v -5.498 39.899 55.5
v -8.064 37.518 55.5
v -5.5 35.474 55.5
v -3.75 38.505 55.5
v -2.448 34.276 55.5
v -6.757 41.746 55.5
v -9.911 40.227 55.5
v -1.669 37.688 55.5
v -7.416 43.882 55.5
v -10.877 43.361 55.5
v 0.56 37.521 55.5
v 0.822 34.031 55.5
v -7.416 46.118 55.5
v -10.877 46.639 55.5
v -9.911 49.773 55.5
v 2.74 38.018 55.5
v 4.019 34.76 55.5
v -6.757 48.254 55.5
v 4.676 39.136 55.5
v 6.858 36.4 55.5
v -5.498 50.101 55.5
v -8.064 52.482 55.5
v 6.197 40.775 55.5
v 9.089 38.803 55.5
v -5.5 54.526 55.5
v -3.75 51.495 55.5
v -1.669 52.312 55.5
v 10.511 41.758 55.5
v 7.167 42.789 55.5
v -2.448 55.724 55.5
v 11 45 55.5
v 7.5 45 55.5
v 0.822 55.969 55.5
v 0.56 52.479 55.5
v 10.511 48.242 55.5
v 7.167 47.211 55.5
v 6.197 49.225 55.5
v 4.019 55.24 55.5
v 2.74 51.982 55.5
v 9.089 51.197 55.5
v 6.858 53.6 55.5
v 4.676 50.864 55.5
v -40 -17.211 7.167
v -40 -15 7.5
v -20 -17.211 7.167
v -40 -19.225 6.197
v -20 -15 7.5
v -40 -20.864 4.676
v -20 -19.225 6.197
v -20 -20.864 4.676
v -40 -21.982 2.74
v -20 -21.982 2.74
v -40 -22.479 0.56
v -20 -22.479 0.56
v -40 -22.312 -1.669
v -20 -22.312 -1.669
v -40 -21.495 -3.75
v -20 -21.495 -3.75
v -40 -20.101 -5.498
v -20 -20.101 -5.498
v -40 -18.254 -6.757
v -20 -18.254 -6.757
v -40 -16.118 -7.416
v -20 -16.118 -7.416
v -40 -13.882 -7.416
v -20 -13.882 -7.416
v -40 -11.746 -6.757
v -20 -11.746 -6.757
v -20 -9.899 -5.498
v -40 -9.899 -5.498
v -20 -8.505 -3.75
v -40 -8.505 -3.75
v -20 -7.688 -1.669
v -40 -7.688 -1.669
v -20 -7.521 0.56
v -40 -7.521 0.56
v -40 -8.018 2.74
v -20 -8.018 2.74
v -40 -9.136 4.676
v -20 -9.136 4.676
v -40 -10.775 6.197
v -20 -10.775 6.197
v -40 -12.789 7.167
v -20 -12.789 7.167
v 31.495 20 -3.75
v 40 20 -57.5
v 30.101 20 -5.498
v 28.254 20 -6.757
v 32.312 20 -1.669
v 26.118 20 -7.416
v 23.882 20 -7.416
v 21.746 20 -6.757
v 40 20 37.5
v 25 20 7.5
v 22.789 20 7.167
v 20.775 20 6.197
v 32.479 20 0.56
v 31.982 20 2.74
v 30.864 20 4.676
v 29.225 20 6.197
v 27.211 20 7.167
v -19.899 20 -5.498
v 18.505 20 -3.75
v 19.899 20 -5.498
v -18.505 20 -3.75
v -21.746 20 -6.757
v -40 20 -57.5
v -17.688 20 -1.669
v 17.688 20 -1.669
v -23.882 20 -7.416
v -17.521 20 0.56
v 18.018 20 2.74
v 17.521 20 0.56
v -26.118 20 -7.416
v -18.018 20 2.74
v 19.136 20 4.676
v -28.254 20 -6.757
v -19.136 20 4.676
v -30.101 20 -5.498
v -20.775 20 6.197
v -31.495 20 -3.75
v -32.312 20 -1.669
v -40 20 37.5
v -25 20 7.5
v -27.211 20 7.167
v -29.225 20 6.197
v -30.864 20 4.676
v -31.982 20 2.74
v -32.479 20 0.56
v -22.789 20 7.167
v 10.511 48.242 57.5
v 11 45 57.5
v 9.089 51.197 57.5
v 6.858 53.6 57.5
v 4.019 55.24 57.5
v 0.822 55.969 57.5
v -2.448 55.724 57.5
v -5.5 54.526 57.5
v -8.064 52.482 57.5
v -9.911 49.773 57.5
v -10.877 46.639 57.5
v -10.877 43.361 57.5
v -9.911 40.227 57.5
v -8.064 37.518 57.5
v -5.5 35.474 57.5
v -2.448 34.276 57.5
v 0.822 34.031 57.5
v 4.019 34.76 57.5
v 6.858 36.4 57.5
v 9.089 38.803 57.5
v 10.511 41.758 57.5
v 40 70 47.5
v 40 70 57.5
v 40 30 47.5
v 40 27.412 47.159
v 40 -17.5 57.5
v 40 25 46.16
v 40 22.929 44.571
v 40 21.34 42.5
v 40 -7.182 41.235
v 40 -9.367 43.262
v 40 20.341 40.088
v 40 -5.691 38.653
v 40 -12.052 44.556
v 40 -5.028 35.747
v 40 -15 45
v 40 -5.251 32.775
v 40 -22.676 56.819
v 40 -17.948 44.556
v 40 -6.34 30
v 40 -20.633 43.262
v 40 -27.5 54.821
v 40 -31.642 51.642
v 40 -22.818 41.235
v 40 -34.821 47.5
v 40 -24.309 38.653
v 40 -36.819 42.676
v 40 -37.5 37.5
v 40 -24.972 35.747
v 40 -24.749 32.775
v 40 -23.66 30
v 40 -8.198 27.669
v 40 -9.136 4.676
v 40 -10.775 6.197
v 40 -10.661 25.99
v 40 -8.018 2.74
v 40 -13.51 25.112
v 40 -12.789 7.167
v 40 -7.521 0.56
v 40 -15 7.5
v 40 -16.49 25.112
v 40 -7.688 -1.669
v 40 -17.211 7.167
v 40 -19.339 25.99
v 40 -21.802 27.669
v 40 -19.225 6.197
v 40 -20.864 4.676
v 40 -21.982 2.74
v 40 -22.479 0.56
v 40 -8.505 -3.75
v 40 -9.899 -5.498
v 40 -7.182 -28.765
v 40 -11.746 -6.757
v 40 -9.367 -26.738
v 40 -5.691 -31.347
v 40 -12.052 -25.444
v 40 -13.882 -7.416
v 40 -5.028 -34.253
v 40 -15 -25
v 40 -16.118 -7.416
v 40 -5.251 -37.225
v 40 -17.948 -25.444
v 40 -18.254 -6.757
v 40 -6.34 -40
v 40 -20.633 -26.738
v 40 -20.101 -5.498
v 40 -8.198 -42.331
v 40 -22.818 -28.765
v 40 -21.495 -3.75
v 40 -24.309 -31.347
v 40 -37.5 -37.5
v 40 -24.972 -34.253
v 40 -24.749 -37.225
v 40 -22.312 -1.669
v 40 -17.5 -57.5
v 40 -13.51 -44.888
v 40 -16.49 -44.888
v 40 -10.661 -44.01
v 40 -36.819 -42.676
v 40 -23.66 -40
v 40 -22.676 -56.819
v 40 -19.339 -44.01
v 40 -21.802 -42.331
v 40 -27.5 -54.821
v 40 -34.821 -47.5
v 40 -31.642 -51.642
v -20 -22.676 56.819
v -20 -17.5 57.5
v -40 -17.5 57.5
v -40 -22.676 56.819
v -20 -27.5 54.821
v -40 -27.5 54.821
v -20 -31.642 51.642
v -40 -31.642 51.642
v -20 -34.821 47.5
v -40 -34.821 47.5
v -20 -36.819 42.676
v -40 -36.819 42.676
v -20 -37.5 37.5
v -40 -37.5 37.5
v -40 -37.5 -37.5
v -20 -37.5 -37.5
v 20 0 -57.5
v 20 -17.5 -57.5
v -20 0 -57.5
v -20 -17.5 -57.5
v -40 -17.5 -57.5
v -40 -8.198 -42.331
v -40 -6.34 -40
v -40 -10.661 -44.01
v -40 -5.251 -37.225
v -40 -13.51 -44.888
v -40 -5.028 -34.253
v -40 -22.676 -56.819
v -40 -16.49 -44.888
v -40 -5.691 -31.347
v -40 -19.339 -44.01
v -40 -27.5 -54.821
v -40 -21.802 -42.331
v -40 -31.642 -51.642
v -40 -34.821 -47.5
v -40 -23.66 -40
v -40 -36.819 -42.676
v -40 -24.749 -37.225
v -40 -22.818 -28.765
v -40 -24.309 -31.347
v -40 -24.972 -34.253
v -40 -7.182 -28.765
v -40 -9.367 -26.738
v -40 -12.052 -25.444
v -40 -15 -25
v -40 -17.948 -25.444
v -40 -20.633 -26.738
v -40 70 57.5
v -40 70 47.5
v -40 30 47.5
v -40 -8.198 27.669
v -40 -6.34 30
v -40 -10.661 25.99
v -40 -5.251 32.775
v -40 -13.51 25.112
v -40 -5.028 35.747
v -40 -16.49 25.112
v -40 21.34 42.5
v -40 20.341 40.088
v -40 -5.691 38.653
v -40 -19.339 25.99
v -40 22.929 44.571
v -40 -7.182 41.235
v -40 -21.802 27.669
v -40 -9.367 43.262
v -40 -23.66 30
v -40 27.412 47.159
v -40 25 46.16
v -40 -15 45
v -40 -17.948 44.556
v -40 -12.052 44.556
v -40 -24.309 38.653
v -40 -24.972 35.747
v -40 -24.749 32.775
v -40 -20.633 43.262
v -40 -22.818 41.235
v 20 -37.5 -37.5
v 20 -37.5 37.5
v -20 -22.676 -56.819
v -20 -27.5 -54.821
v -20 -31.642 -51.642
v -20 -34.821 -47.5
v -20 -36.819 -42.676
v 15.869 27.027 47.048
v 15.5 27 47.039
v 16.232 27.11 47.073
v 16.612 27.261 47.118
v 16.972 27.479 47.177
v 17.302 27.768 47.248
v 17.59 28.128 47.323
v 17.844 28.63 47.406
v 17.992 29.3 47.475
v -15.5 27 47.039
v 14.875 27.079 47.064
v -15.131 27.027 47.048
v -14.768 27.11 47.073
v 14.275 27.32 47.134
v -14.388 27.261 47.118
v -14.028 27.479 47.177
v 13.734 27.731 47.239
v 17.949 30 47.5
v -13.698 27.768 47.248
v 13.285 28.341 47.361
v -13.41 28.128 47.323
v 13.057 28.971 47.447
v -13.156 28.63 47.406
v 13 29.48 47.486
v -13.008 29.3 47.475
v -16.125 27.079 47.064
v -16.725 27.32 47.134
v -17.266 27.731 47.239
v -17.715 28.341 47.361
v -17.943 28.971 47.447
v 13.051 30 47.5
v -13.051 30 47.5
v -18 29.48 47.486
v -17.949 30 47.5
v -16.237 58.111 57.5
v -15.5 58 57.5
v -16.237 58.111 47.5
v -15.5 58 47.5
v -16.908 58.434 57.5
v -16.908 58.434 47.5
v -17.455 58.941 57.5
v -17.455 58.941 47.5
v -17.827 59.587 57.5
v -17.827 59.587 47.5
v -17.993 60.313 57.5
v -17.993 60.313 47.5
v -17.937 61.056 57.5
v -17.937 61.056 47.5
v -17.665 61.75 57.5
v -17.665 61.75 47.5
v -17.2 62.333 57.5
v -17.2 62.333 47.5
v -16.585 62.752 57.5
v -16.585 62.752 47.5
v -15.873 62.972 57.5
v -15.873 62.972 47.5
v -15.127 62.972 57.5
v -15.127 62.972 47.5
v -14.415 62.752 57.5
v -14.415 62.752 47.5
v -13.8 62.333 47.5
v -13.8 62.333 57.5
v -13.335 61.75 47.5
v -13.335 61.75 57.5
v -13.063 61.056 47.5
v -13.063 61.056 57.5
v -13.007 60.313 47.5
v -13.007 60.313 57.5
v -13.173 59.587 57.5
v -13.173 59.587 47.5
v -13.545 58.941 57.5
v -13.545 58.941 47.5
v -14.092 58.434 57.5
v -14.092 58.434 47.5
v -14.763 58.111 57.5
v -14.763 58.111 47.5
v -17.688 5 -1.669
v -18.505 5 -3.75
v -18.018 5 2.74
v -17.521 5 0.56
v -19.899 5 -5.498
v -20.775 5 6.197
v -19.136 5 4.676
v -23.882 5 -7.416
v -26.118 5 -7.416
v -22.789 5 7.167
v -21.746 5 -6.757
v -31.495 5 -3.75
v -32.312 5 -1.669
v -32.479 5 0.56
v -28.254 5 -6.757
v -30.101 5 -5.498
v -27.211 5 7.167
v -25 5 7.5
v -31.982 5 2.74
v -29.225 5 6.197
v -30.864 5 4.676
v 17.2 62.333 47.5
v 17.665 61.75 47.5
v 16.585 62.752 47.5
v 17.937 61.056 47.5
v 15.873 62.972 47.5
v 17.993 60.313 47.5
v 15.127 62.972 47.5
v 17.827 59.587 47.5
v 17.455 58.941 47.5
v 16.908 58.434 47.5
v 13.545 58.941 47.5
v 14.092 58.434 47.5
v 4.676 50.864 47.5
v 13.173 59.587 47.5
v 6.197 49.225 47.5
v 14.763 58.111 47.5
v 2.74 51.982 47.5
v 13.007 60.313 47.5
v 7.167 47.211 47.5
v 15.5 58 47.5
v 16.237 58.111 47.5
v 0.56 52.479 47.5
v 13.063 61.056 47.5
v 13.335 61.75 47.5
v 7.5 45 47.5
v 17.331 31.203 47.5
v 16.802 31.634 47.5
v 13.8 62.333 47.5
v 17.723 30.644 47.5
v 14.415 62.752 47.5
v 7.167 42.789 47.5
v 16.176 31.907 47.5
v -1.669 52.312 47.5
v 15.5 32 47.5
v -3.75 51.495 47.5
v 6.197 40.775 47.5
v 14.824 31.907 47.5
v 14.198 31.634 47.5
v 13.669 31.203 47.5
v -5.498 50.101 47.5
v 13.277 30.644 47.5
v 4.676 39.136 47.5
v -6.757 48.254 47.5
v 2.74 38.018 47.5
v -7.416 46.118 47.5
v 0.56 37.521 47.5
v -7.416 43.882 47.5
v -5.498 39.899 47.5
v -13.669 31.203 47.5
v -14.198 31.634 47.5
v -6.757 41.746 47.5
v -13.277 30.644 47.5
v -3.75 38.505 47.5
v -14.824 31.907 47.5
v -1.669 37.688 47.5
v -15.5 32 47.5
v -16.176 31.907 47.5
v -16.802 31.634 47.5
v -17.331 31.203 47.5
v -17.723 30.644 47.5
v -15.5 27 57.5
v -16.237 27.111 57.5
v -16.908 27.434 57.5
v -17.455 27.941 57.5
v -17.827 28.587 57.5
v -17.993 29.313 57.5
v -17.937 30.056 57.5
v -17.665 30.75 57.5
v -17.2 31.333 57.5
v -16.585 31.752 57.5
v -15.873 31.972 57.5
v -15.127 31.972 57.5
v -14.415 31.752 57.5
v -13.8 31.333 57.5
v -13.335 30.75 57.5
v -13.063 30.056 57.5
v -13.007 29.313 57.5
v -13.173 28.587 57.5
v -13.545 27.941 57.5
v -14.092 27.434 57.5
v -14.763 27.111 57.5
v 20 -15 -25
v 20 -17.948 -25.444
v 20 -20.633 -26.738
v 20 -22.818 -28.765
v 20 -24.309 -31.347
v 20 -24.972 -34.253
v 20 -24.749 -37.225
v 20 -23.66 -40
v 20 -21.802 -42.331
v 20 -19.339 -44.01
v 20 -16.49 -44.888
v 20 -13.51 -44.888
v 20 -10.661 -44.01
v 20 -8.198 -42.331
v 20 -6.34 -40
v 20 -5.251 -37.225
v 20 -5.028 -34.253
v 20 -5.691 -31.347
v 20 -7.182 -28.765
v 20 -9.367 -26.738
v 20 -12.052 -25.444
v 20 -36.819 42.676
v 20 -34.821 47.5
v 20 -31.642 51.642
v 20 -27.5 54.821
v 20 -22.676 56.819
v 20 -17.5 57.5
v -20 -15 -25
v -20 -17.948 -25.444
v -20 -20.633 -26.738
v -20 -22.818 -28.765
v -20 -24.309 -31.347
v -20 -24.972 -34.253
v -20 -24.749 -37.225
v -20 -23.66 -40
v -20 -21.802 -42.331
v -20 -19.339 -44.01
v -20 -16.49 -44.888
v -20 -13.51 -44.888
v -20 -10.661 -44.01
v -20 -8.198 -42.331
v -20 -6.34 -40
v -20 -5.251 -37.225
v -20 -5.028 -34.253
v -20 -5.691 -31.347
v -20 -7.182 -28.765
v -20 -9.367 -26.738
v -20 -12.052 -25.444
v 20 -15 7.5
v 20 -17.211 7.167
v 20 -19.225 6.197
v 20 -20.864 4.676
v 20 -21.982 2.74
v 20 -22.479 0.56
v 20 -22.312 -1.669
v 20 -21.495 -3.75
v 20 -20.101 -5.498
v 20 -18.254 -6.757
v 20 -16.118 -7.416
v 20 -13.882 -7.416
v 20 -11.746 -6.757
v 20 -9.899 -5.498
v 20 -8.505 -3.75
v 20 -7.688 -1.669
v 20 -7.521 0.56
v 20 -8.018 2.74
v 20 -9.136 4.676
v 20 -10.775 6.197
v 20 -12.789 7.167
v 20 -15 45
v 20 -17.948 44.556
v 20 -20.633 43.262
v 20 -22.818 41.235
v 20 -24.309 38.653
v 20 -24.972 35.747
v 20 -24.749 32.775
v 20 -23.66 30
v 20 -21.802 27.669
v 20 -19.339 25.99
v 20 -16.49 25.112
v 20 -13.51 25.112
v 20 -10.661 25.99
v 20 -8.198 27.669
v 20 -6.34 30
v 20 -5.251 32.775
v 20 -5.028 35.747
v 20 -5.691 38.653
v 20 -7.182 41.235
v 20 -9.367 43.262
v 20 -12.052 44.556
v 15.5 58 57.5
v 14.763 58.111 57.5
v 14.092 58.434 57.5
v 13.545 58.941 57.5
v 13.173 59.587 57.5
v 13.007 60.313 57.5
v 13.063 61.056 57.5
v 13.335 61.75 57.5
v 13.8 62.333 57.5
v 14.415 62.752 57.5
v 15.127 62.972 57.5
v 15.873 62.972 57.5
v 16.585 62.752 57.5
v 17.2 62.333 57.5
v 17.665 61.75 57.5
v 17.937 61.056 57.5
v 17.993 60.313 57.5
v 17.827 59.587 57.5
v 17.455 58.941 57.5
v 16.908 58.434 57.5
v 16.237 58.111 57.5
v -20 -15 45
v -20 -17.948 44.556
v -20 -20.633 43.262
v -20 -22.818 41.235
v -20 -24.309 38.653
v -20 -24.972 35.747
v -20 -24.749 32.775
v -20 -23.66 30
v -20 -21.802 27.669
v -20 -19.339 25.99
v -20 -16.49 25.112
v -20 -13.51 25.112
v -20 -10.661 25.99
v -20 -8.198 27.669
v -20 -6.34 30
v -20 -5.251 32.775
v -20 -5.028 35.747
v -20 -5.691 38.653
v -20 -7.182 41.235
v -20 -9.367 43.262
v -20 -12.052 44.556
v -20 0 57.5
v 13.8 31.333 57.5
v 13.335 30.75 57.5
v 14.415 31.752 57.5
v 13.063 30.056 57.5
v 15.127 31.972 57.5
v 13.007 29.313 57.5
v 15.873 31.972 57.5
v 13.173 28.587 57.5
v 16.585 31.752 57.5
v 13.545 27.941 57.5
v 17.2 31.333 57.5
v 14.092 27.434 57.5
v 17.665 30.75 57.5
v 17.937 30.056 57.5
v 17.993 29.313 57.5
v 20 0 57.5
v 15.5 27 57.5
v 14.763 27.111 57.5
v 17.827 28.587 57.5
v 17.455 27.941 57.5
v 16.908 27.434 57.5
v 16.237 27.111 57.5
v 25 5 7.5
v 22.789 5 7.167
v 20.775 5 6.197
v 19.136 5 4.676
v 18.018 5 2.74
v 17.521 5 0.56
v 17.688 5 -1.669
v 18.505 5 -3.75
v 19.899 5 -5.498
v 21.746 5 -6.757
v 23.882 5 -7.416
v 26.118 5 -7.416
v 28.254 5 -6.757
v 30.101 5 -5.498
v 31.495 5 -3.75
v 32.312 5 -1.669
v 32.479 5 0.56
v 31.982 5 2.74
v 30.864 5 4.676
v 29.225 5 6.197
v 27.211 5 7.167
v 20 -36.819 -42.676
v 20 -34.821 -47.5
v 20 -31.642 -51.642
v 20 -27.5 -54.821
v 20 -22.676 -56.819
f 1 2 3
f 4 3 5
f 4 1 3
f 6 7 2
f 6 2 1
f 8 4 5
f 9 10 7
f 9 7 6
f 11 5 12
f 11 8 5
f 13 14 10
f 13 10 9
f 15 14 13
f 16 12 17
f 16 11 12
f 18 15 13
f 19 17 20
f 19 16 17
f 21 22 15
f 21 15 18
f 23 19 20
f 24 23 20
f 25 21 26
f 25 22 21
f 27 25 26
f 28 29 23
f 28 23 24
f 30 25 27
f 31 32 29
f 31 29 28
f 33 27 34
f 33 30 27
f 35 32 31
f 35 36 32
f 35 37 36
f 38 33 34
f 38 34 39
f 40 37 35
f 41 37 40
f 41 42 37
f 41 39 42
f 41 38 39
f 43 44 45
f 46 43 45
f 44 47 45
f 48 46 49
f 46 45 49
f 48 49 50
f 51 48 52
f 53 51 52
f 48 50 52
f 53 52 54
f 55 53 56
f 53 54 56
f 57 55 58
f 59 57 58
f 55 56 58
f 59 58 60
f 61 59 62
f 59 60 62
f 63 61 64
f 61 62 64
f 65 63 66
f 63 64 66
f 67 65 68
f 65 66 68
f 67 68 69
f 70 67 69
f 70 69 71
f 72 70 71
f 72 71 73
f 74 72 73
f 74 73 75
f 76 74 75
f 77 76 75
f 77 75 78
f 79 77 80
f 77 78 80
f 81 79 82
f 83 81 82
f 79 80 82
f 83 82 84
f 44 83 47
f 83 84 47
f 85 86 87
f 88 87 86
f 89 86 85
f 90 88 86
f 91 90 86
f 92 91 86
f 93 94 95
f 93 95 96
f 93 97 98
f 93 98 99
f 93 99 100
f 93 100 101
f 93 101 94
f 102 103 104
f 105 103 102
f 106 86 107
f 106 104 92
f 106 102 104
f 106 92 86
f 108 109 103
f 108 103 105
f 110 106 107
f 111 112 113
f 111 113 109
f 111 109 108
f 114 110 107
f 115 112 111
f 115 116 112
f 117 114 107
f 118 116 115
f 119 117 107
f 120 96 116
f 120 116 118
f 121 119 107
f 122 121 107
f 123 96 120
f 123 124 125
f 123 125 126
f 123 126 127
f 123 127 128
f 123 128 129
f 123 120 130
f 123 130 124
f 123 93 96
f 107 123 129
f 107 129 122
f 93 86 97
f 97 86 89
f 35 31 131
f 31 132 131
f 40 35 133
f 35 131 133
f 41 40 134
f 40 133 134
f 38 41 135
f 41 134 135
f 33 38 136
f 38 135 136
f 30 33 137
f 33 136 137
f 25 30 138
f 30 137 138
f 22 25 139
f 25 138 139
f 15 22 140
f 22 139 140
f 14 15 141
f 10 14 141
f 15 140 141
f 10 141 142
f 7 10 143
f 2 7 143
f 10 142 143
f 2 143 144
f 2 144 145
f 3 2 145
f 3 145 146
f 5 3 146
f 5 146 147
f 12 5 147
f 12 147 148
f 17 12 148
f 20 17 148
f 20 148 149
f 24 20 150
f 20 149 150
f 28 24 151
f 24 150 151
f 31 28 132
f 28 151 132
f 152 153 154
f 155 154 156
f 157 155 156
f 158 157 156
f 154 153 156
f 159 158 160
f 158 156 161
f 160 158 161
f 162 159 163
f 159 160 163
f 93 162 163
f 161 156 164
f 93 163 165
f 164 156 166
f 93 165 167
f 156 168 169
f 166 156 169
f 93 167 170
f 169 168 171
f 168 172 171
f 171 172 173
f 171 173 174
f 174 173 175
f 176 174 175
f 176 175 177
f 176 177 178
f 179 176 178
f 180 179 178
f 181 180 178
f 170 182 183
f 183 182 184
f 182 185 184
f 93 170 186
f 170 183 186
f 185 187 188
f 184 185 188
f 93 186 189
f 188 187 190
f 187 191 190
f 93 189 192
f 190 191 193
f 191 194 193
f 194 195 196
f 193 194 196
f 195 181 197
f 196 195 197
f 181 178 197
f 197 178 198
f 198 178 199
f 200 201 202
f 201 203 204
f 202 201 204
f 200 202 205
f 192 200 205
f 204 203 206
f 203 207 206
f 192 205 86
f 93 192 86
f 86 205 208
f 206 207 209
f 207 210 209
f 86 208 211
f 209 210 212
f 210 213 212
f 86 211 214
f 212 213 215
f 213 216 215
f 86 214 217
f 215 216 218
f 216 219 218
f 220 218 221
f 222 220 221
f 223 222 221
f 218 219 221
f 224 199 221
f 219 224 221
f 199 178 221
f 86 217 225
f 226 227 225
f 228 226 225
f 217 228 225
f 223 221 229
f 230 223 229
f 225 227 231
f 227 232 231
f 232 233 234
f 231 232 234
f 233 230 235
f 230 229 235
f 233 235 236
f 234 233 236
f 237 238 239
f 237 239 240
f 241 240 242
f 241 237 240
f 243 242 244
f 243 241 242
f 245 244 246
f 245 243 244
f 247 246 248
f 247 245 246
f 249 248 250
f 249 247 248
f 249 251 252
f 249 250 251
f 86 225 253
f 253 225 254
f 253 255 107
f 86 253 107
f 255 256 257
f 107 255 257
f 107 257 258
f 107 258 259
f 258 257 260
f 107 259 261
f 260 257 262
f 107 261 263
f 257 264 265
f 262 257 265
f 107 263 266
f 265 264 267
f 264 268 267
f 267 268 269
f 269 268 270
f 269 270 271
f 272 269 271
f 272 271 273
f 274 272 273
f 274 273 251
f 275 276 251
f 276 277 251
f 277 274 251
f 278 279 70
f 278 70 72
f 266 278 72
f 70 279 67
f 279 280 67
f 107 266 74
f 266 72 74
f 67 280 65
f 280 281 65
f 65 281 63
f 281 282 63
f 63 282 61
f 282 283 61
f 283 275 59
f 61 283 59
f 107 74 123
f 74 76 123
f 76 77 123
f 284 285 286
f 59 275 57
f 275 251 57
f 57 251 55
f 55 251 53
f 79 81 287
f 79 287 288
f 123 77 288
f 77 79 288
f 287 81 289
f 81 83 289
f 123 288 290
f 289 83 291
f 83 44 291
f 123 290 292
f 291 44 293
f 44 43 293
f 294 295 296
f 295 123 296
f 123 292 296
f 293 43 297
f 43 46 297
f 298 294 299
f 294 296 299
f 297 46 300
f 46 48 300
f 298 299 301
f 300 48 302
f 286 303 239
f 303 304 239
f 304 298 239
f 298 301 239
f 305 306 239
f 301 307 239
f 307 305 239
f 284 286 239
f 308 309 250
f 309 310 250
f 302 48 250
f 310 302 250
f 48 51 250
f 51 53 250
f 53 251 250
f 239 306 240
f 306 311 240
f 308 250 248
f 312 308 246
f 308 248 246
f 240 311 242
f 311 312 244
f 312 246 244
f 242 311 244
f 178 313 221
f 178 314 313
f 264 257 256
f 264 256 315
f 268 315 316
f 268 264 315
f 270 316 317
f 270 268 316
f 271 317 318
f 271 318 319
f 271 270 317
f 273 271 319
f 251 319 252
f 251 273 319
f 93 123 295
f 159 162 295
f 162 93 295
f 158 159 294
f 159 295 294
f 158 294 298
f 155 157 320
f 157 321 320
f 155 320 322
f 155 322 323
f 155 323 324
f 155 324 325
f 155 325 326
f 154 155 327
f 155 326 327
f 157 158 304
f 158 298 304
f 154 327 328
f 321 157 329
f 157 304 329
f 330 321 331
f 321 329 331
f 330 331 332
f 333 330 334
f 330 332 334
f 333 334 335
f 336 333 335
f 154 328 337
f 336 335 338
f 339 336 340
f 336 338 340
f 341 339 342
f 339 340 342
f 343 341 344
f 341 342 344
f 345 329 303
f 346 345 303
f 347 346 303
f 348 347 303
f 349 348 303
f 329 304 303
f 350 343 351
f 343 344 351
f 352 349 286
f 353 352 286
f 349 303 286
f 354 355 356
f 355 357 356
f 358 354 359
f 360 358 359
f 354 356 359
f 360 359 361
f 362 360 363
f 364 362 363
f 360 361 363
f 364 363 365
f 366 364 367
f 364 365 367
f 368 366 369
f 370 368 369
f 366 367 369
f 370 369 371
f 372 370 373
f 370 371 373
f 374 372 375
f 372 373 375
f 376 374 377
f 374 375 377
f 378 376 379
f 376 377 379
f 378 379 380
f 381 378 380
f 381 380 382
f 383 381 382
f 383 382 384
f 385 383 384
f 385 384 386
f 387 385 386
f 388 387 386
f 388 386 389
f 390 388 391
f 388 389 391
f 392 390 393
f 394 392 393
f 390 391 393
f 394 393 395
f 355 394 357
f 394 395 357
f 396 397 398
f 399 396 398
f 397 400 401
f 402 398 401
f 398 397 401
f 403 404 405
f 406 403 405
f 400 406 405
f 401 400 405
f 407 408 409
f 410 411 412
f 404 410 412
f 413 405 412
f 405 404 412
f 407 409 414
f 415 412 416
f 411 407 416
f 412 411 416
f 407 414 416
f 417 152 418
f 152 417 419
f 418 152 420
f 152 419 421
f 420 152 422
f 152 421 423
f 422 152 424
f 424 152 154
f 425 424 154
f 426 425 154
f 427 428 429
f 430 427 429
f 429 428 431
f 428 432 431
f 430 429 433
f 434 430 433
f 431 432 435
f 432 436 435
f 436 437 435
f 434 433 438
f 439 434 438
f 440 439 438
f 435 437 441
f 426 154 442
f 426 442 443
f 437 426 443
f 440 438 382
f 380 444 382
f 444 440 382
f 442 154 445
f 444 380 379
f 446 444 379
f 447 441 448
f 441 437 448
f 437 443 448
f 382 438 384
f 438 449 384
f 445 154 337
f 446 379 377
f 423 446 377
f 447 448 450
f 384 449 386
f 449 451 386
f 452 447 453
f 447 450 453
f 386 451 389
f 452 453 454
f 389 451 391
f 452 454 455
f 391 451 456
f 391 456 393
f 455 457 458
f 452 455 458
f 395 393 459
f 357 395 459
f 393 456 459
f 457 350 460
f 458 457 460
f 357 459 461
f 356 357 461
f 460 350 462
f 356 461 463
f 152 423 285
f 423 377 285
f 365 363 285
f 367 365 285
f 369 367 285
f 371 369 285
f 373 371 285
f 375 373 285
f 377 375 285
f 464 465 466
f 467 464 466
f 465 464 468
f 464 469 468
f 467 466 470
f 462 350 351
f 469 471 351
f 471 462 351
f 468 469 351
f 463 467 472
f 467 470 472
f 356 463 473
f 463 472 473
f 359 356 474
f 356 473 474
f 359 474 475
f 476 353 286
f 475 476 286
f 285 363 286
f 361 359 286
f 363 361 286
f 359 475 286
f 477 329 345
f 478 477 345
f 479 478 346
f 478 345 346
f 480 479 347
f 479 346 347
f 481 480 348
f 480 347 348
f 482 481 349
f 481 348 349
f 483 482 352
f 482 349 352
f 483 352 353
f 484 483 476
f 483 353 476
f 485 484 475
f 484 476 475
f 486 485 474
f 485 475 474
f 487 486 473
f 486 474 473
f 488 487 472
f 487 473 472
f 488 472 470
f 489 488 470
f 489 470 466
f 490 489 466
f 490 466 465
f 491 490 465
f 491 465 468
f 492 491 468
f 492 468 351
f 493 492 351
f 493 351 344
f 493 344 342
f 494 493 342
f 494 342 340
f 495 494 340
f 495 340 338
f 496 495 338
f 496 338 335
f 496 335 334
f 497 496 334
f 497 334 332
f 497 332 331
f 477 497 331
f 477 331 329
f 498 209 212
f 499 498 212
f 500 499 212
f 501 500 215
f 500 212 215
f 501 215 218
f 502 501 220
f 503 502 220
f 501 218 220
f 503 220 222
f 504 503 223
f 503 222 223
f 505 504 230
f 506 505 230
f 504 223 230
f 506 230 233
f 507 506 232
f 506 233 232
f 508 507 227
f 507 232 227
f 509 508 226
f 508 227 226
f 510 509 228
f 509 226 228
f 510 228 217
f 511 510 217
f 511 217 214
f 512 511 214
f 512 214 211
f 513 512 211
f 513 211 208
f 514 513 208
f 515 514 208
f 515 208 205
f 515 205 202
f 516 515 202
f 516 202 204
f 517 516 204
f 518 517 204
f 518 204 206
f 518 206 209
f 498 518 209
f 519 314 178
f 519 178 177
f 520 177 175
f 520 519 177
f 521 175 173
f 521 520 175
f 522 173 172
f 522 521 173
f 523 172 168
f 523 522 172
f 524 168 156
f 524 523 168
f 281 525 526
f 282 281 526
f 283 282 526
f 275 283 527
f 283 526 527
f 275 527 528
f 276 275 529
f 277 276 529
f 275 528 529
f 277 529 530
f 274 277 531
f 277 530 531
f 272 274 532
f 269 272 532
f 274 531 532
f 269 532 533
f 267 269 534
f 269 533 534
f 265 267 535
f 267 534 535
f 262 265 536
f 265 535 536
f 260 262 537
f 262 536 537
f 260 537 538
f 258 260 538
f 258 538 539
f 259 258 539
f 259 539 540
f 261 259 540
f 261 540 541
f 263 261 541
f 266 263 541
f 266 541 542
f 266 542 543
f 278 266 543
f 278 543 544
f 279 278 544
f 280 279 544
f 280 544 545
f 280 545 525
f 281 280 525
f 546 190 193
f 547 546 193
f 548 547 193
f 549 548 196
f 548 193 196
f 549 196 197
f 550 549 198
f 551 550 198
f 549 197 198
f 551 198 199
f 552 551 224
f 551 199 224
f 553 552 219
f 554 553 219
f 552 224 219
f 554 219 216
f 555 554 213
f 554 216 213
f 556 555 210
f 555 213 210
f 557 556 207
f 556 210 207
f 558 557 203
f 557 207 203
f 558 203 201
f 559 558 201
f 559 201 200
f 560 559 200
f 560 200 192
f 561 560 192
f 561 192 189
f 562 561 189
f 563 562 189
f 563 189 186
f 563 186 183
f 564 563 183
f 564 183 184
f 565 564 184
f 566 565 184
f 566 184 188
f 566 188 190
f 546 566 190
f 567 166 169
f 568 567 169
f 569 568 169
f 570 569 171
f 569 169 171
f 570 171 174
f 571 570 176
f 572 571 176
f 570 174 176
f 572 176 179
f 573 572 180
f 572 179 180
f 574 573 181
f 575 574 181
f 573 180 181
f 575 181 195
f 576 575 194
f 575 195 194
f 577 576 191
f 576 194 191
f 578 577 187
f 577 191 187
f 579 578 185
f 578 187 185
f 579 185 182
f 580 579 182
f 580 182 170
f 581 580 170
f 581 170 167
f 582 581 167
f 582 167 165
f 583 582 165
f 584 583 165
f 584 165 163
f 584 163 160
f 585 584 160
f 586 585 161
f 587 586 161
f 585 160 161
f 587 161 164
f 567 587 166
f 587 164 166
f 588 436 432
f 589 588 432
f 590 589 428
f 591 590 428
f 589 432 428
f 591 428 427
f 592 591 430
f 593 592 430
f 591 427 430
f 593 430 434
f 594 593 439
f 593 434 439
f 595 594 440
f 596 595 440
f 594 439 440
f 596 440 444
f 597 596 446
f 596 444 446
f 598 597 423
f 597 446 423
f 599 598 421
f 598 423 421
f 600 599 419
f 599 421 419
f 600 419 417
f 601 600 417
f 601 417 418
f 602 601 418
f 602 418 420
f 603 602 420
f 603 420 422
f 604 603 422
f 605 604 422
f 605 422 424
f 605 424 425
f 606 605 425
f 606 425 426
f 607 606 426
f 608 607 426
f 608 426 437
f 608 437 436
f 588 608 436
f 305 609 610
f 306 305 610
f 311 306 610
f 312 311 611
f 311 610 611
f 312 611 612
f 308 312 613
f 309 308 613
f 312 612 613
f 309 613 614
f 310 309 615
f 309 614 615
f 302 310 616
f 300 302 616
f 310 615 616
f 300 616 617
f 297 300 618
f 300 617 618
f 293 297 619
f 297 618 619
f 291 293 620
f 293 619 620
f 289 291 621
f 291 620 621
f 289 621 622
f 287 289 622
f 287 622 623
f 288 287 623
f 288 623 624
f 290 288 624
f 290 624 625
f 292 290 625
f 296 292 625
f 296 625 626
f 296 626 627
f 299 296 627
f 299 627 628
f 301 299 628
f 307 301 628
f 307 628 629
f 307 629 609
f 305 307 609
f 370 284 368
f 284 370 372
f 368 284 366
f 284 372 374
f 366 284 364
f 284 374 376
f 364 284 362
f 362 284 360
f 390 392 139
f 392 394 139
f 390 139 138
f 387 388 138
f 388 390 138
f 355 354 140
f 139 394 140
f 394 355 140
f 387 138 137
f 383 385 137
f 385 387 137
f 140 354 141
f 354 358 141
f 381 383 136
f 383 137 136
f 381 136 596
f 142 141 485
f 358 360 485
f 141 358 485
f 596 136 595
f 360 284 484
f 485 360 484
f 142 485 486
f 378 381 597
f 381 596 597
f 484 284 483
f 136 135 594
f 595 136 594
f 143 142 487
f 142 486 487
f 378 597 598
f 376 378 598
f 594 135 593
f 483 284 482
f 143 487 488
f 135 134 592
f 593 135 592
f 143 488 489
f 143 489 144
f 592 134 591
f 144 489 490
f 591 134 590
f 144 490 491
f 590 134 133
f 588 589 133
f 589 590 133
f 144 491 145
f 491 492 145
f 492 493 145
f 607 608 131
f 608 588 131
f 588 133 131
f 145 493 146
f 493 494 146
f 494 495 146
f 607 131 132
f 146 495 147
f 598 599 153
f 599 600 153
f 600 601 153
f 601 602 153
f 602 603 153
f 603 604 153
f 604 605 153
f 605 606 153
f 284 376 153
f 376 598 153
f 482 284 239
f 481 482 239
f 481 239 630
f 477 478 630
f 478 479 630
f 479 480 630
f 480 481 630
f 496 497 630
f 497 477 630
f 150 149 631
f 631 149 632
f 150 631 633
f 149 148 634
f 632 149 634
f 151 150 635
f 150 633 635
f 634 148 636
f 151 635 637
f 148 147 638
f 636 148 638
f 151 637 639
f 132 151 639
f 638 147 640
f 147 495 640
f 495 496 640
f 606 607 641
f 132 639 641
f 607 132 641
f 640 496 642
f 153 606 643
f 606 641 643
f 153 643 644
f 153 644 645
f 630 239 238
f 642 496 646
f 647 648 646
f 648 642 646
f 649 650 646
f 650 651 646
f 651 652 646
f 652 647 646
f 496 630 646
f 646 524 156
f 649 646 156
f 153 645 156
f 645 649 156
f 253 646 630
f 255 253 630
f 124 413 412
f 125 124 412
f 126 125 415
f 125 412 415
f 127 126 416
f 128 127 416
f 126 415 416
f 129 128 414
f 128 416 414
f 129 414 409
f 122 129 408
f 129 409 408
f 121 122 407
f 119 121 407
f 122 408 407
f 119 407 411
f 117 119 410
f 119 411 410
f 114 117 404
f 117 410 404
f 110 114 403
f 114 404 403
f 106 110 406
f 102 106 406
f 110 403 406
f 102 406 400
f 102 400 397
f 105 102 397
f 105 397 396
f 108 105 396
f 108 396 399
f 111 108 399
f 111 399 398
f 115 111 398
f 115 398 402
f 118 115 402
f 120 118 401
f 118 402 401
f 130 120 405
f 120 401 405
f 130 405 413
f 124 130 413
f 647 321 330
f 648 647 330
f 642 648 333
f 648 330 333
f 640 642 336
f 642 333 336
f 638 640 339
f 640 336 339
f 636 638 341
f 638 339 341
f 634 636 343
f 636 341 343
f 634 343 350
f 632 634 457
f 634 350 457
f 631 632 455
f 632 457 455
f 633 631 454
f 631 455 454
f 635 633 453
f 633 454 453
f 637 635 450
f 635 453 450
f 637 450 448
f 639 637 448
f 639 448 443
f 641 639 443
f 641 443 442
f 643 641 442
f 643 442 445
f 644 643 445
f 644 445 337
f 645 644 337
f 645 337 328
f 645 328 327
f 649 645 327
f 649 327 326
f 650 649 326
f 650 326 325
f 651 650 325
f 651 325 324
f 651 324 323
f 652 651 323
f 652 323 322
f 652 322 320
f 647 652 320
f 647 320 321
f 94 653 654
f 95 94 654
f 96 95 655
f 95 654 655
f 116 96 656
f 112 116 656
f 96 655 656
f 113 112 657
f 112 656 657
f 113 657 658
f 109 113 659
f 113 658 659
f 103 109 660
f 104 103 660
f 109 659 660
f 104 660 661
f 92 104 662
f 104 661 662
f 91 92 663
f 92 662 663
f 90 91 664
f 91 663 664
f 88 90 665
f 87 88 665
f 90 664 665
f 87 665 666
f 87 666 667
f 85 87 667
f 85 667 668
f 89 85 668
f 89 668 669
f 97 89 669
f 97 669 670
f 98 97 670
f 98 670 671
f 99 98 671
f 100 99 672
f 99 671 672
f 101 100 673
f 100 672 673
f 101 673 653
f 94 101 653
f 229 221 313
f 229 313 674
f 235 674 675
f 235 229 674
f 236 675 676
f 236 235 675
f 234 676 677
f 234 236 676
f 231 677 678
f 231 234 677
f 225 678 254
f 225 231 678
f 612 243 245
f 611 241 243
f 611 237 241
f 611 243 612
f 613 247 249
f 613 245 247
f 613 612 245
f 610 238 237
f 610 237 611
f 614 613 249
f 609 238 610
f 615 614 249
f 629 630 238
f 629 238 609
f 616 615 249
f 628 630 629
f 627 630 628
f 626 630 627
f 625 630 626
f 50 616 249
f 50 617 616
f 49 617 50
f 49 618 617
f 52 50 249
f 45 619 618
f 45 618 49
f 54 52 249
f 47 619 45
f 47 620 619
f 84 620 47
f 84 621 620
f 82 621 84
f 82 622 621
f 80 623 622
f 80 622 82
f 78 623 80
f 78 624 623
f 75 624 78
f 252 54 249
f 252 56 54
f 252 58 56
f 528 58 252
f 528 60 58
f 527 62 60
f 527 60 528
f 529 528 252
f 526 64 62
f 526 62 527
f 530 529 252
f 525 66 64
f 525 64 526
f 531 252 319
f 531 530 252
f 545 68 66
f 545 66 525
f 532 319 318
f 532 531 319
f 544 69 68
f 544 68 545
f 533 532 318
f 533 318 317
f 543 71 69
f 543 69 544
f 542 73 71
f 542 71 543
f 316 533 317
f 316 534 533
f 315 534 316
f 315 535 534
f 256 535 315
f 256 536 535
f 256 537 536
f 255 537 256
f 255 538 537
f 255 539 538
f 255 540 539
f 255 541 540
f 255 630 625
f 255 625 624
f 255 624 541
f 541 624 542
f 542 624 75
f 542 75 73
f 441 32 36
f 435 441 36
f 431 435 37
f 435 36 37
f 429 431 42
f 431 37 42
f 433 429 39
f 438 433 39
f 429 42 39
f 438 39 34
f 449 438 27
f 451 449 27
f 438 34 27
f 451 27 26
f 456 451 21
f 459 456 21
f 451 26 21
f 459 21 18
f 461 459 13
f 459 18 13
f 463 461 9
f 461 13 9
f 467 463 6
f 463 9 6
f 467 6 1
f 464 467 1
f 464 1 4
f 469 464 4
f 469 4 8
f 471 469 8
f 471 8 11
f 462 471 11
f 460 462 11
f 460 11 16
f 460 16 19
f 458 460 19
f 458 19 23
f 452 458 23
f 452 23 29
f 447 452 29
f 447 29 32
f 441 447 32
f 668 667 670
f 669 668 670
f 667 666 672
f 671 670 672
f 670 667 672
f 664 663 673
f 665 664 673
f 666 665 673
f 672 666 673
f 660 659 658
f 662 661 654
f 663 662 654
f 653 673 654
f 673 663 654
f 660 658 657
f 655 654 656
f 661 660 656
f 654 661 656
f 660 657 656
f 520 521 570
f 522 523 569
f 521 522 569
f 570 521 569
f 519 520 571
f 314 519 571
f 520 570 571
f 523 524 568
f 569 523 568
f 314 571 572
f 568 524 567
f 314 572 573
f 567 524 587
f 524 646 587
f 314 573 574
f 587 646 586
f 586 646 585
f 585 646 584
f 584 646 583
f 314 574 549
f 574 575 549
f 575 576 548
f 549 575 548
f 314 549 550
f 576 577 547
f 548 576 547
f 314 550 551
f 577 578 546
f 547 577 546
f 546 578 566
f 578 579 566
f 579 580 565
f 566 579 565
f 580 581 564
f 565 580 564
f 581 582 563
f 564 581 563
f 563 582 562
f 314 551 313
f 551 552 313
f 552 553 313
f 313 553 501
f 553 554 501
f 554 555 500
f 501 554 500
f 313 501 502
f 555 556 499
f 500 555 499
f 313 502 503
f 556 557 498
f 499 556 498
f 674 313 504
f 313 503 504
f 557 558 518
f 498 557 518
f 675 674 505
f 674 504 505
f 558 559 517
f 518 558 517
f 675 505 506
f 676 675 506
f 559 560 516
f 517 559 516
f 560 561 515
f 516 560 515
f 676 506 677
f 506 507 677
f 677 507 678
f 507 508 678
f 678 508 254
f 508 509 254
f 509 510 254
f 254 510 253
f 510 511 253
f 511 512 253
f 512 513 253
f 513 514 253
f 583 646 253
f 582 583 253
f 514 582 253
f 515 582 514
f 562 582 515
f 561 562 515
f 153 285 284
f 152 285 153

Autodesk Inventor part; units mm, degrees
ref_plane "YZ Plane" through (0, 0, 0) normal (1, 0, 0) x (0, 1, 0)
ref_plane "XZ Plane" through (0, 0, 0) normal (0, 1, 0) x (-1, 0, 0)
ref_plane "XY Plane" through (0, 0, 0) normal (0, 0, 1) x (1, 0, 0)
sketch "Sketch1" plane through (0, 0, 0) normal (0, 1, 0) x (-1, 0, 0)
  line L0 (40, 57.5) -> (-40, 57.5)
  line L1 (-40, 57.5) -> (-40, -57.5)
  line L2 (-40, -57.5) -> (40, -57.5)
  line L3 (40, -57.5) -> (40, 57.5)
  point P0 (0, 0)
  point P1 (40, 0)
  point P2 (0, 57.5)
  dimension "d0" = 115
  dimension "d1" = 80
extrude "Extrusion1" add sketch "Sketch1" along normal blind 20
sketch "Sketch12" plane through (0, 0, 0) normal (0, -1, 0) x (1, 0, 0)
  line L0 (-40, 57.5) -> (-20, 57.5)
  line L1 (-20, 57.5) -> (-20, -57.5)
  line L2 (-20, -57.5) -> (-40, -57.5)
  line L3 (-40, -57.5) -> (-40, 57.5)
  line L4 (-40, -57.5) -> (-40, 57.5) projected
  line L5 (0, 100.8809) -> (0, -116.5773) construction
  line L6 (40, 57.5) -> (20, 57.5)
  line L7 (20, 57.5) -> (20, -57.5)
  line L8 (20, -57.5) -> (40, -57.5)
  line L9 (40, -57.5) -> (40, 57.5)
  point P0 (0, 0)
  point P1 (-40, 0)
  point P2 (0, 0)
  point P3 (-20, 0)
  dimension "d56" = 20
  dimension "d57" = 115
extrude "Extrusion11" add sketch "Sketch12" along normal blind 37.5
sketch "Sketch13" plane through (-40, 0, 57.5) normal (-1, 0, 0) x (0, 0, 1)
  line L0 (0, 0) -> (-115, 0) projected
  point P0 (-57.5, 0)
  point P1 (-22.5, -15)
  point P2 (-92.5, -15)
  point P3 (-57.5, -15)
  point P4 (-57.5, 0)
  dimension "d129" = 35
  dimension "d130" = 35
  dimension "d131" = 15
hole "Hole2" at (-40, -15, 35) at (-40, -15, -35) direction (1, 0, 0) diameter 20 end through all
hole "Hole3" at (-40, -15, 0) direction (1, 0, 0) diameter 15 end through all
sketch "Sketch19" plane through (0, 20, 0) normal (0, 1, 0) x (1, 0, 0)
  point P0 (0, 0)
  point P1 (25, 0)
  point P2 (-25, 0)
  dimension "d111" = 25
  dimension "d112" = 25
hole "Hole6" at (25, 20, 0) at (-25, 20, 0) direction (0, -1, 0) diameter 15 depth 15
fillet "Fillet19" radius 20 4 edges at (-30, -37.5, -57.5) (30, -37.5, -57.5) (30, -37.5, 57.5) (-30, -37.5, 57.5)
sketch "Sketch20" plane through (0, 20, 0) normal (0, 1, 0) x (1, 0, 0)
  line L0 (-40, -57.5) -> (40, -57.5)
  line L1 (40, -57.5) -> (40, -47.5)
  line L2 (40, -47.5) -> (-40, -47.5)
  line L3 (-40, -47.5) -> (-40, -57.5)
  line L4 (-40, 57.5) -> (-40, -57.5) projected
  line L5 (40, -57.5) -> (40, 57.5) projected
  line L6 (-40, -57.5) -> (40, -57.5) projected
  point P0 (0, 0)
  dimension "d122" = 10
extrude "Extrusion15" add sketch "Sketch20" along normal blind 50
sketch "Sketch21" plane through (-40, 20, 57.5) normal (0, 0, 1) x (1, 0, 0)
  circle A0 centre (40, 25) radius 7.5
  line L0 (20, -20) -> (60, -20) projected
  line L1 (0, 50) -> (80, 50) projected
  circle A1 centre (40, 25) radius 11
  point P0 (40, -20)
  point P1 (40, -20)
  point P2 (0, -20)
  point P3 (80, -20)
  point P4 (24.5, 40.5)
  point P5 (24.5, 9.5)
  point P6 (55.5, 9.5)
  point P7 (55.5, 40.5)
  dimension "d128" = 15
  dimension "d132" = 25
  dimension "d134" = 15.5
  dimension "d135" = 15.5
  dimension "d138" = 360
  dimension "d147" = 22
extrude "Extrusion16" cut sketch "Sketch21" against normal blind 50 contours A0
fillet "Fillet20" radius 10 1 edges at (0, 20, 47.5)
hole "Hole7" at (-15.5, 60.5, 57.5) at (-15.5, 29.5, 57.5) at (15.5, 29.5, 57.5) at (15.5, 60.5, 57.5) direction (0, 0, -1) diameter 5 depth 15
extrude "Extrusion17" cut sketch "Sketch21" against normal blind 2
properties part number "Y_Slider_Part"
